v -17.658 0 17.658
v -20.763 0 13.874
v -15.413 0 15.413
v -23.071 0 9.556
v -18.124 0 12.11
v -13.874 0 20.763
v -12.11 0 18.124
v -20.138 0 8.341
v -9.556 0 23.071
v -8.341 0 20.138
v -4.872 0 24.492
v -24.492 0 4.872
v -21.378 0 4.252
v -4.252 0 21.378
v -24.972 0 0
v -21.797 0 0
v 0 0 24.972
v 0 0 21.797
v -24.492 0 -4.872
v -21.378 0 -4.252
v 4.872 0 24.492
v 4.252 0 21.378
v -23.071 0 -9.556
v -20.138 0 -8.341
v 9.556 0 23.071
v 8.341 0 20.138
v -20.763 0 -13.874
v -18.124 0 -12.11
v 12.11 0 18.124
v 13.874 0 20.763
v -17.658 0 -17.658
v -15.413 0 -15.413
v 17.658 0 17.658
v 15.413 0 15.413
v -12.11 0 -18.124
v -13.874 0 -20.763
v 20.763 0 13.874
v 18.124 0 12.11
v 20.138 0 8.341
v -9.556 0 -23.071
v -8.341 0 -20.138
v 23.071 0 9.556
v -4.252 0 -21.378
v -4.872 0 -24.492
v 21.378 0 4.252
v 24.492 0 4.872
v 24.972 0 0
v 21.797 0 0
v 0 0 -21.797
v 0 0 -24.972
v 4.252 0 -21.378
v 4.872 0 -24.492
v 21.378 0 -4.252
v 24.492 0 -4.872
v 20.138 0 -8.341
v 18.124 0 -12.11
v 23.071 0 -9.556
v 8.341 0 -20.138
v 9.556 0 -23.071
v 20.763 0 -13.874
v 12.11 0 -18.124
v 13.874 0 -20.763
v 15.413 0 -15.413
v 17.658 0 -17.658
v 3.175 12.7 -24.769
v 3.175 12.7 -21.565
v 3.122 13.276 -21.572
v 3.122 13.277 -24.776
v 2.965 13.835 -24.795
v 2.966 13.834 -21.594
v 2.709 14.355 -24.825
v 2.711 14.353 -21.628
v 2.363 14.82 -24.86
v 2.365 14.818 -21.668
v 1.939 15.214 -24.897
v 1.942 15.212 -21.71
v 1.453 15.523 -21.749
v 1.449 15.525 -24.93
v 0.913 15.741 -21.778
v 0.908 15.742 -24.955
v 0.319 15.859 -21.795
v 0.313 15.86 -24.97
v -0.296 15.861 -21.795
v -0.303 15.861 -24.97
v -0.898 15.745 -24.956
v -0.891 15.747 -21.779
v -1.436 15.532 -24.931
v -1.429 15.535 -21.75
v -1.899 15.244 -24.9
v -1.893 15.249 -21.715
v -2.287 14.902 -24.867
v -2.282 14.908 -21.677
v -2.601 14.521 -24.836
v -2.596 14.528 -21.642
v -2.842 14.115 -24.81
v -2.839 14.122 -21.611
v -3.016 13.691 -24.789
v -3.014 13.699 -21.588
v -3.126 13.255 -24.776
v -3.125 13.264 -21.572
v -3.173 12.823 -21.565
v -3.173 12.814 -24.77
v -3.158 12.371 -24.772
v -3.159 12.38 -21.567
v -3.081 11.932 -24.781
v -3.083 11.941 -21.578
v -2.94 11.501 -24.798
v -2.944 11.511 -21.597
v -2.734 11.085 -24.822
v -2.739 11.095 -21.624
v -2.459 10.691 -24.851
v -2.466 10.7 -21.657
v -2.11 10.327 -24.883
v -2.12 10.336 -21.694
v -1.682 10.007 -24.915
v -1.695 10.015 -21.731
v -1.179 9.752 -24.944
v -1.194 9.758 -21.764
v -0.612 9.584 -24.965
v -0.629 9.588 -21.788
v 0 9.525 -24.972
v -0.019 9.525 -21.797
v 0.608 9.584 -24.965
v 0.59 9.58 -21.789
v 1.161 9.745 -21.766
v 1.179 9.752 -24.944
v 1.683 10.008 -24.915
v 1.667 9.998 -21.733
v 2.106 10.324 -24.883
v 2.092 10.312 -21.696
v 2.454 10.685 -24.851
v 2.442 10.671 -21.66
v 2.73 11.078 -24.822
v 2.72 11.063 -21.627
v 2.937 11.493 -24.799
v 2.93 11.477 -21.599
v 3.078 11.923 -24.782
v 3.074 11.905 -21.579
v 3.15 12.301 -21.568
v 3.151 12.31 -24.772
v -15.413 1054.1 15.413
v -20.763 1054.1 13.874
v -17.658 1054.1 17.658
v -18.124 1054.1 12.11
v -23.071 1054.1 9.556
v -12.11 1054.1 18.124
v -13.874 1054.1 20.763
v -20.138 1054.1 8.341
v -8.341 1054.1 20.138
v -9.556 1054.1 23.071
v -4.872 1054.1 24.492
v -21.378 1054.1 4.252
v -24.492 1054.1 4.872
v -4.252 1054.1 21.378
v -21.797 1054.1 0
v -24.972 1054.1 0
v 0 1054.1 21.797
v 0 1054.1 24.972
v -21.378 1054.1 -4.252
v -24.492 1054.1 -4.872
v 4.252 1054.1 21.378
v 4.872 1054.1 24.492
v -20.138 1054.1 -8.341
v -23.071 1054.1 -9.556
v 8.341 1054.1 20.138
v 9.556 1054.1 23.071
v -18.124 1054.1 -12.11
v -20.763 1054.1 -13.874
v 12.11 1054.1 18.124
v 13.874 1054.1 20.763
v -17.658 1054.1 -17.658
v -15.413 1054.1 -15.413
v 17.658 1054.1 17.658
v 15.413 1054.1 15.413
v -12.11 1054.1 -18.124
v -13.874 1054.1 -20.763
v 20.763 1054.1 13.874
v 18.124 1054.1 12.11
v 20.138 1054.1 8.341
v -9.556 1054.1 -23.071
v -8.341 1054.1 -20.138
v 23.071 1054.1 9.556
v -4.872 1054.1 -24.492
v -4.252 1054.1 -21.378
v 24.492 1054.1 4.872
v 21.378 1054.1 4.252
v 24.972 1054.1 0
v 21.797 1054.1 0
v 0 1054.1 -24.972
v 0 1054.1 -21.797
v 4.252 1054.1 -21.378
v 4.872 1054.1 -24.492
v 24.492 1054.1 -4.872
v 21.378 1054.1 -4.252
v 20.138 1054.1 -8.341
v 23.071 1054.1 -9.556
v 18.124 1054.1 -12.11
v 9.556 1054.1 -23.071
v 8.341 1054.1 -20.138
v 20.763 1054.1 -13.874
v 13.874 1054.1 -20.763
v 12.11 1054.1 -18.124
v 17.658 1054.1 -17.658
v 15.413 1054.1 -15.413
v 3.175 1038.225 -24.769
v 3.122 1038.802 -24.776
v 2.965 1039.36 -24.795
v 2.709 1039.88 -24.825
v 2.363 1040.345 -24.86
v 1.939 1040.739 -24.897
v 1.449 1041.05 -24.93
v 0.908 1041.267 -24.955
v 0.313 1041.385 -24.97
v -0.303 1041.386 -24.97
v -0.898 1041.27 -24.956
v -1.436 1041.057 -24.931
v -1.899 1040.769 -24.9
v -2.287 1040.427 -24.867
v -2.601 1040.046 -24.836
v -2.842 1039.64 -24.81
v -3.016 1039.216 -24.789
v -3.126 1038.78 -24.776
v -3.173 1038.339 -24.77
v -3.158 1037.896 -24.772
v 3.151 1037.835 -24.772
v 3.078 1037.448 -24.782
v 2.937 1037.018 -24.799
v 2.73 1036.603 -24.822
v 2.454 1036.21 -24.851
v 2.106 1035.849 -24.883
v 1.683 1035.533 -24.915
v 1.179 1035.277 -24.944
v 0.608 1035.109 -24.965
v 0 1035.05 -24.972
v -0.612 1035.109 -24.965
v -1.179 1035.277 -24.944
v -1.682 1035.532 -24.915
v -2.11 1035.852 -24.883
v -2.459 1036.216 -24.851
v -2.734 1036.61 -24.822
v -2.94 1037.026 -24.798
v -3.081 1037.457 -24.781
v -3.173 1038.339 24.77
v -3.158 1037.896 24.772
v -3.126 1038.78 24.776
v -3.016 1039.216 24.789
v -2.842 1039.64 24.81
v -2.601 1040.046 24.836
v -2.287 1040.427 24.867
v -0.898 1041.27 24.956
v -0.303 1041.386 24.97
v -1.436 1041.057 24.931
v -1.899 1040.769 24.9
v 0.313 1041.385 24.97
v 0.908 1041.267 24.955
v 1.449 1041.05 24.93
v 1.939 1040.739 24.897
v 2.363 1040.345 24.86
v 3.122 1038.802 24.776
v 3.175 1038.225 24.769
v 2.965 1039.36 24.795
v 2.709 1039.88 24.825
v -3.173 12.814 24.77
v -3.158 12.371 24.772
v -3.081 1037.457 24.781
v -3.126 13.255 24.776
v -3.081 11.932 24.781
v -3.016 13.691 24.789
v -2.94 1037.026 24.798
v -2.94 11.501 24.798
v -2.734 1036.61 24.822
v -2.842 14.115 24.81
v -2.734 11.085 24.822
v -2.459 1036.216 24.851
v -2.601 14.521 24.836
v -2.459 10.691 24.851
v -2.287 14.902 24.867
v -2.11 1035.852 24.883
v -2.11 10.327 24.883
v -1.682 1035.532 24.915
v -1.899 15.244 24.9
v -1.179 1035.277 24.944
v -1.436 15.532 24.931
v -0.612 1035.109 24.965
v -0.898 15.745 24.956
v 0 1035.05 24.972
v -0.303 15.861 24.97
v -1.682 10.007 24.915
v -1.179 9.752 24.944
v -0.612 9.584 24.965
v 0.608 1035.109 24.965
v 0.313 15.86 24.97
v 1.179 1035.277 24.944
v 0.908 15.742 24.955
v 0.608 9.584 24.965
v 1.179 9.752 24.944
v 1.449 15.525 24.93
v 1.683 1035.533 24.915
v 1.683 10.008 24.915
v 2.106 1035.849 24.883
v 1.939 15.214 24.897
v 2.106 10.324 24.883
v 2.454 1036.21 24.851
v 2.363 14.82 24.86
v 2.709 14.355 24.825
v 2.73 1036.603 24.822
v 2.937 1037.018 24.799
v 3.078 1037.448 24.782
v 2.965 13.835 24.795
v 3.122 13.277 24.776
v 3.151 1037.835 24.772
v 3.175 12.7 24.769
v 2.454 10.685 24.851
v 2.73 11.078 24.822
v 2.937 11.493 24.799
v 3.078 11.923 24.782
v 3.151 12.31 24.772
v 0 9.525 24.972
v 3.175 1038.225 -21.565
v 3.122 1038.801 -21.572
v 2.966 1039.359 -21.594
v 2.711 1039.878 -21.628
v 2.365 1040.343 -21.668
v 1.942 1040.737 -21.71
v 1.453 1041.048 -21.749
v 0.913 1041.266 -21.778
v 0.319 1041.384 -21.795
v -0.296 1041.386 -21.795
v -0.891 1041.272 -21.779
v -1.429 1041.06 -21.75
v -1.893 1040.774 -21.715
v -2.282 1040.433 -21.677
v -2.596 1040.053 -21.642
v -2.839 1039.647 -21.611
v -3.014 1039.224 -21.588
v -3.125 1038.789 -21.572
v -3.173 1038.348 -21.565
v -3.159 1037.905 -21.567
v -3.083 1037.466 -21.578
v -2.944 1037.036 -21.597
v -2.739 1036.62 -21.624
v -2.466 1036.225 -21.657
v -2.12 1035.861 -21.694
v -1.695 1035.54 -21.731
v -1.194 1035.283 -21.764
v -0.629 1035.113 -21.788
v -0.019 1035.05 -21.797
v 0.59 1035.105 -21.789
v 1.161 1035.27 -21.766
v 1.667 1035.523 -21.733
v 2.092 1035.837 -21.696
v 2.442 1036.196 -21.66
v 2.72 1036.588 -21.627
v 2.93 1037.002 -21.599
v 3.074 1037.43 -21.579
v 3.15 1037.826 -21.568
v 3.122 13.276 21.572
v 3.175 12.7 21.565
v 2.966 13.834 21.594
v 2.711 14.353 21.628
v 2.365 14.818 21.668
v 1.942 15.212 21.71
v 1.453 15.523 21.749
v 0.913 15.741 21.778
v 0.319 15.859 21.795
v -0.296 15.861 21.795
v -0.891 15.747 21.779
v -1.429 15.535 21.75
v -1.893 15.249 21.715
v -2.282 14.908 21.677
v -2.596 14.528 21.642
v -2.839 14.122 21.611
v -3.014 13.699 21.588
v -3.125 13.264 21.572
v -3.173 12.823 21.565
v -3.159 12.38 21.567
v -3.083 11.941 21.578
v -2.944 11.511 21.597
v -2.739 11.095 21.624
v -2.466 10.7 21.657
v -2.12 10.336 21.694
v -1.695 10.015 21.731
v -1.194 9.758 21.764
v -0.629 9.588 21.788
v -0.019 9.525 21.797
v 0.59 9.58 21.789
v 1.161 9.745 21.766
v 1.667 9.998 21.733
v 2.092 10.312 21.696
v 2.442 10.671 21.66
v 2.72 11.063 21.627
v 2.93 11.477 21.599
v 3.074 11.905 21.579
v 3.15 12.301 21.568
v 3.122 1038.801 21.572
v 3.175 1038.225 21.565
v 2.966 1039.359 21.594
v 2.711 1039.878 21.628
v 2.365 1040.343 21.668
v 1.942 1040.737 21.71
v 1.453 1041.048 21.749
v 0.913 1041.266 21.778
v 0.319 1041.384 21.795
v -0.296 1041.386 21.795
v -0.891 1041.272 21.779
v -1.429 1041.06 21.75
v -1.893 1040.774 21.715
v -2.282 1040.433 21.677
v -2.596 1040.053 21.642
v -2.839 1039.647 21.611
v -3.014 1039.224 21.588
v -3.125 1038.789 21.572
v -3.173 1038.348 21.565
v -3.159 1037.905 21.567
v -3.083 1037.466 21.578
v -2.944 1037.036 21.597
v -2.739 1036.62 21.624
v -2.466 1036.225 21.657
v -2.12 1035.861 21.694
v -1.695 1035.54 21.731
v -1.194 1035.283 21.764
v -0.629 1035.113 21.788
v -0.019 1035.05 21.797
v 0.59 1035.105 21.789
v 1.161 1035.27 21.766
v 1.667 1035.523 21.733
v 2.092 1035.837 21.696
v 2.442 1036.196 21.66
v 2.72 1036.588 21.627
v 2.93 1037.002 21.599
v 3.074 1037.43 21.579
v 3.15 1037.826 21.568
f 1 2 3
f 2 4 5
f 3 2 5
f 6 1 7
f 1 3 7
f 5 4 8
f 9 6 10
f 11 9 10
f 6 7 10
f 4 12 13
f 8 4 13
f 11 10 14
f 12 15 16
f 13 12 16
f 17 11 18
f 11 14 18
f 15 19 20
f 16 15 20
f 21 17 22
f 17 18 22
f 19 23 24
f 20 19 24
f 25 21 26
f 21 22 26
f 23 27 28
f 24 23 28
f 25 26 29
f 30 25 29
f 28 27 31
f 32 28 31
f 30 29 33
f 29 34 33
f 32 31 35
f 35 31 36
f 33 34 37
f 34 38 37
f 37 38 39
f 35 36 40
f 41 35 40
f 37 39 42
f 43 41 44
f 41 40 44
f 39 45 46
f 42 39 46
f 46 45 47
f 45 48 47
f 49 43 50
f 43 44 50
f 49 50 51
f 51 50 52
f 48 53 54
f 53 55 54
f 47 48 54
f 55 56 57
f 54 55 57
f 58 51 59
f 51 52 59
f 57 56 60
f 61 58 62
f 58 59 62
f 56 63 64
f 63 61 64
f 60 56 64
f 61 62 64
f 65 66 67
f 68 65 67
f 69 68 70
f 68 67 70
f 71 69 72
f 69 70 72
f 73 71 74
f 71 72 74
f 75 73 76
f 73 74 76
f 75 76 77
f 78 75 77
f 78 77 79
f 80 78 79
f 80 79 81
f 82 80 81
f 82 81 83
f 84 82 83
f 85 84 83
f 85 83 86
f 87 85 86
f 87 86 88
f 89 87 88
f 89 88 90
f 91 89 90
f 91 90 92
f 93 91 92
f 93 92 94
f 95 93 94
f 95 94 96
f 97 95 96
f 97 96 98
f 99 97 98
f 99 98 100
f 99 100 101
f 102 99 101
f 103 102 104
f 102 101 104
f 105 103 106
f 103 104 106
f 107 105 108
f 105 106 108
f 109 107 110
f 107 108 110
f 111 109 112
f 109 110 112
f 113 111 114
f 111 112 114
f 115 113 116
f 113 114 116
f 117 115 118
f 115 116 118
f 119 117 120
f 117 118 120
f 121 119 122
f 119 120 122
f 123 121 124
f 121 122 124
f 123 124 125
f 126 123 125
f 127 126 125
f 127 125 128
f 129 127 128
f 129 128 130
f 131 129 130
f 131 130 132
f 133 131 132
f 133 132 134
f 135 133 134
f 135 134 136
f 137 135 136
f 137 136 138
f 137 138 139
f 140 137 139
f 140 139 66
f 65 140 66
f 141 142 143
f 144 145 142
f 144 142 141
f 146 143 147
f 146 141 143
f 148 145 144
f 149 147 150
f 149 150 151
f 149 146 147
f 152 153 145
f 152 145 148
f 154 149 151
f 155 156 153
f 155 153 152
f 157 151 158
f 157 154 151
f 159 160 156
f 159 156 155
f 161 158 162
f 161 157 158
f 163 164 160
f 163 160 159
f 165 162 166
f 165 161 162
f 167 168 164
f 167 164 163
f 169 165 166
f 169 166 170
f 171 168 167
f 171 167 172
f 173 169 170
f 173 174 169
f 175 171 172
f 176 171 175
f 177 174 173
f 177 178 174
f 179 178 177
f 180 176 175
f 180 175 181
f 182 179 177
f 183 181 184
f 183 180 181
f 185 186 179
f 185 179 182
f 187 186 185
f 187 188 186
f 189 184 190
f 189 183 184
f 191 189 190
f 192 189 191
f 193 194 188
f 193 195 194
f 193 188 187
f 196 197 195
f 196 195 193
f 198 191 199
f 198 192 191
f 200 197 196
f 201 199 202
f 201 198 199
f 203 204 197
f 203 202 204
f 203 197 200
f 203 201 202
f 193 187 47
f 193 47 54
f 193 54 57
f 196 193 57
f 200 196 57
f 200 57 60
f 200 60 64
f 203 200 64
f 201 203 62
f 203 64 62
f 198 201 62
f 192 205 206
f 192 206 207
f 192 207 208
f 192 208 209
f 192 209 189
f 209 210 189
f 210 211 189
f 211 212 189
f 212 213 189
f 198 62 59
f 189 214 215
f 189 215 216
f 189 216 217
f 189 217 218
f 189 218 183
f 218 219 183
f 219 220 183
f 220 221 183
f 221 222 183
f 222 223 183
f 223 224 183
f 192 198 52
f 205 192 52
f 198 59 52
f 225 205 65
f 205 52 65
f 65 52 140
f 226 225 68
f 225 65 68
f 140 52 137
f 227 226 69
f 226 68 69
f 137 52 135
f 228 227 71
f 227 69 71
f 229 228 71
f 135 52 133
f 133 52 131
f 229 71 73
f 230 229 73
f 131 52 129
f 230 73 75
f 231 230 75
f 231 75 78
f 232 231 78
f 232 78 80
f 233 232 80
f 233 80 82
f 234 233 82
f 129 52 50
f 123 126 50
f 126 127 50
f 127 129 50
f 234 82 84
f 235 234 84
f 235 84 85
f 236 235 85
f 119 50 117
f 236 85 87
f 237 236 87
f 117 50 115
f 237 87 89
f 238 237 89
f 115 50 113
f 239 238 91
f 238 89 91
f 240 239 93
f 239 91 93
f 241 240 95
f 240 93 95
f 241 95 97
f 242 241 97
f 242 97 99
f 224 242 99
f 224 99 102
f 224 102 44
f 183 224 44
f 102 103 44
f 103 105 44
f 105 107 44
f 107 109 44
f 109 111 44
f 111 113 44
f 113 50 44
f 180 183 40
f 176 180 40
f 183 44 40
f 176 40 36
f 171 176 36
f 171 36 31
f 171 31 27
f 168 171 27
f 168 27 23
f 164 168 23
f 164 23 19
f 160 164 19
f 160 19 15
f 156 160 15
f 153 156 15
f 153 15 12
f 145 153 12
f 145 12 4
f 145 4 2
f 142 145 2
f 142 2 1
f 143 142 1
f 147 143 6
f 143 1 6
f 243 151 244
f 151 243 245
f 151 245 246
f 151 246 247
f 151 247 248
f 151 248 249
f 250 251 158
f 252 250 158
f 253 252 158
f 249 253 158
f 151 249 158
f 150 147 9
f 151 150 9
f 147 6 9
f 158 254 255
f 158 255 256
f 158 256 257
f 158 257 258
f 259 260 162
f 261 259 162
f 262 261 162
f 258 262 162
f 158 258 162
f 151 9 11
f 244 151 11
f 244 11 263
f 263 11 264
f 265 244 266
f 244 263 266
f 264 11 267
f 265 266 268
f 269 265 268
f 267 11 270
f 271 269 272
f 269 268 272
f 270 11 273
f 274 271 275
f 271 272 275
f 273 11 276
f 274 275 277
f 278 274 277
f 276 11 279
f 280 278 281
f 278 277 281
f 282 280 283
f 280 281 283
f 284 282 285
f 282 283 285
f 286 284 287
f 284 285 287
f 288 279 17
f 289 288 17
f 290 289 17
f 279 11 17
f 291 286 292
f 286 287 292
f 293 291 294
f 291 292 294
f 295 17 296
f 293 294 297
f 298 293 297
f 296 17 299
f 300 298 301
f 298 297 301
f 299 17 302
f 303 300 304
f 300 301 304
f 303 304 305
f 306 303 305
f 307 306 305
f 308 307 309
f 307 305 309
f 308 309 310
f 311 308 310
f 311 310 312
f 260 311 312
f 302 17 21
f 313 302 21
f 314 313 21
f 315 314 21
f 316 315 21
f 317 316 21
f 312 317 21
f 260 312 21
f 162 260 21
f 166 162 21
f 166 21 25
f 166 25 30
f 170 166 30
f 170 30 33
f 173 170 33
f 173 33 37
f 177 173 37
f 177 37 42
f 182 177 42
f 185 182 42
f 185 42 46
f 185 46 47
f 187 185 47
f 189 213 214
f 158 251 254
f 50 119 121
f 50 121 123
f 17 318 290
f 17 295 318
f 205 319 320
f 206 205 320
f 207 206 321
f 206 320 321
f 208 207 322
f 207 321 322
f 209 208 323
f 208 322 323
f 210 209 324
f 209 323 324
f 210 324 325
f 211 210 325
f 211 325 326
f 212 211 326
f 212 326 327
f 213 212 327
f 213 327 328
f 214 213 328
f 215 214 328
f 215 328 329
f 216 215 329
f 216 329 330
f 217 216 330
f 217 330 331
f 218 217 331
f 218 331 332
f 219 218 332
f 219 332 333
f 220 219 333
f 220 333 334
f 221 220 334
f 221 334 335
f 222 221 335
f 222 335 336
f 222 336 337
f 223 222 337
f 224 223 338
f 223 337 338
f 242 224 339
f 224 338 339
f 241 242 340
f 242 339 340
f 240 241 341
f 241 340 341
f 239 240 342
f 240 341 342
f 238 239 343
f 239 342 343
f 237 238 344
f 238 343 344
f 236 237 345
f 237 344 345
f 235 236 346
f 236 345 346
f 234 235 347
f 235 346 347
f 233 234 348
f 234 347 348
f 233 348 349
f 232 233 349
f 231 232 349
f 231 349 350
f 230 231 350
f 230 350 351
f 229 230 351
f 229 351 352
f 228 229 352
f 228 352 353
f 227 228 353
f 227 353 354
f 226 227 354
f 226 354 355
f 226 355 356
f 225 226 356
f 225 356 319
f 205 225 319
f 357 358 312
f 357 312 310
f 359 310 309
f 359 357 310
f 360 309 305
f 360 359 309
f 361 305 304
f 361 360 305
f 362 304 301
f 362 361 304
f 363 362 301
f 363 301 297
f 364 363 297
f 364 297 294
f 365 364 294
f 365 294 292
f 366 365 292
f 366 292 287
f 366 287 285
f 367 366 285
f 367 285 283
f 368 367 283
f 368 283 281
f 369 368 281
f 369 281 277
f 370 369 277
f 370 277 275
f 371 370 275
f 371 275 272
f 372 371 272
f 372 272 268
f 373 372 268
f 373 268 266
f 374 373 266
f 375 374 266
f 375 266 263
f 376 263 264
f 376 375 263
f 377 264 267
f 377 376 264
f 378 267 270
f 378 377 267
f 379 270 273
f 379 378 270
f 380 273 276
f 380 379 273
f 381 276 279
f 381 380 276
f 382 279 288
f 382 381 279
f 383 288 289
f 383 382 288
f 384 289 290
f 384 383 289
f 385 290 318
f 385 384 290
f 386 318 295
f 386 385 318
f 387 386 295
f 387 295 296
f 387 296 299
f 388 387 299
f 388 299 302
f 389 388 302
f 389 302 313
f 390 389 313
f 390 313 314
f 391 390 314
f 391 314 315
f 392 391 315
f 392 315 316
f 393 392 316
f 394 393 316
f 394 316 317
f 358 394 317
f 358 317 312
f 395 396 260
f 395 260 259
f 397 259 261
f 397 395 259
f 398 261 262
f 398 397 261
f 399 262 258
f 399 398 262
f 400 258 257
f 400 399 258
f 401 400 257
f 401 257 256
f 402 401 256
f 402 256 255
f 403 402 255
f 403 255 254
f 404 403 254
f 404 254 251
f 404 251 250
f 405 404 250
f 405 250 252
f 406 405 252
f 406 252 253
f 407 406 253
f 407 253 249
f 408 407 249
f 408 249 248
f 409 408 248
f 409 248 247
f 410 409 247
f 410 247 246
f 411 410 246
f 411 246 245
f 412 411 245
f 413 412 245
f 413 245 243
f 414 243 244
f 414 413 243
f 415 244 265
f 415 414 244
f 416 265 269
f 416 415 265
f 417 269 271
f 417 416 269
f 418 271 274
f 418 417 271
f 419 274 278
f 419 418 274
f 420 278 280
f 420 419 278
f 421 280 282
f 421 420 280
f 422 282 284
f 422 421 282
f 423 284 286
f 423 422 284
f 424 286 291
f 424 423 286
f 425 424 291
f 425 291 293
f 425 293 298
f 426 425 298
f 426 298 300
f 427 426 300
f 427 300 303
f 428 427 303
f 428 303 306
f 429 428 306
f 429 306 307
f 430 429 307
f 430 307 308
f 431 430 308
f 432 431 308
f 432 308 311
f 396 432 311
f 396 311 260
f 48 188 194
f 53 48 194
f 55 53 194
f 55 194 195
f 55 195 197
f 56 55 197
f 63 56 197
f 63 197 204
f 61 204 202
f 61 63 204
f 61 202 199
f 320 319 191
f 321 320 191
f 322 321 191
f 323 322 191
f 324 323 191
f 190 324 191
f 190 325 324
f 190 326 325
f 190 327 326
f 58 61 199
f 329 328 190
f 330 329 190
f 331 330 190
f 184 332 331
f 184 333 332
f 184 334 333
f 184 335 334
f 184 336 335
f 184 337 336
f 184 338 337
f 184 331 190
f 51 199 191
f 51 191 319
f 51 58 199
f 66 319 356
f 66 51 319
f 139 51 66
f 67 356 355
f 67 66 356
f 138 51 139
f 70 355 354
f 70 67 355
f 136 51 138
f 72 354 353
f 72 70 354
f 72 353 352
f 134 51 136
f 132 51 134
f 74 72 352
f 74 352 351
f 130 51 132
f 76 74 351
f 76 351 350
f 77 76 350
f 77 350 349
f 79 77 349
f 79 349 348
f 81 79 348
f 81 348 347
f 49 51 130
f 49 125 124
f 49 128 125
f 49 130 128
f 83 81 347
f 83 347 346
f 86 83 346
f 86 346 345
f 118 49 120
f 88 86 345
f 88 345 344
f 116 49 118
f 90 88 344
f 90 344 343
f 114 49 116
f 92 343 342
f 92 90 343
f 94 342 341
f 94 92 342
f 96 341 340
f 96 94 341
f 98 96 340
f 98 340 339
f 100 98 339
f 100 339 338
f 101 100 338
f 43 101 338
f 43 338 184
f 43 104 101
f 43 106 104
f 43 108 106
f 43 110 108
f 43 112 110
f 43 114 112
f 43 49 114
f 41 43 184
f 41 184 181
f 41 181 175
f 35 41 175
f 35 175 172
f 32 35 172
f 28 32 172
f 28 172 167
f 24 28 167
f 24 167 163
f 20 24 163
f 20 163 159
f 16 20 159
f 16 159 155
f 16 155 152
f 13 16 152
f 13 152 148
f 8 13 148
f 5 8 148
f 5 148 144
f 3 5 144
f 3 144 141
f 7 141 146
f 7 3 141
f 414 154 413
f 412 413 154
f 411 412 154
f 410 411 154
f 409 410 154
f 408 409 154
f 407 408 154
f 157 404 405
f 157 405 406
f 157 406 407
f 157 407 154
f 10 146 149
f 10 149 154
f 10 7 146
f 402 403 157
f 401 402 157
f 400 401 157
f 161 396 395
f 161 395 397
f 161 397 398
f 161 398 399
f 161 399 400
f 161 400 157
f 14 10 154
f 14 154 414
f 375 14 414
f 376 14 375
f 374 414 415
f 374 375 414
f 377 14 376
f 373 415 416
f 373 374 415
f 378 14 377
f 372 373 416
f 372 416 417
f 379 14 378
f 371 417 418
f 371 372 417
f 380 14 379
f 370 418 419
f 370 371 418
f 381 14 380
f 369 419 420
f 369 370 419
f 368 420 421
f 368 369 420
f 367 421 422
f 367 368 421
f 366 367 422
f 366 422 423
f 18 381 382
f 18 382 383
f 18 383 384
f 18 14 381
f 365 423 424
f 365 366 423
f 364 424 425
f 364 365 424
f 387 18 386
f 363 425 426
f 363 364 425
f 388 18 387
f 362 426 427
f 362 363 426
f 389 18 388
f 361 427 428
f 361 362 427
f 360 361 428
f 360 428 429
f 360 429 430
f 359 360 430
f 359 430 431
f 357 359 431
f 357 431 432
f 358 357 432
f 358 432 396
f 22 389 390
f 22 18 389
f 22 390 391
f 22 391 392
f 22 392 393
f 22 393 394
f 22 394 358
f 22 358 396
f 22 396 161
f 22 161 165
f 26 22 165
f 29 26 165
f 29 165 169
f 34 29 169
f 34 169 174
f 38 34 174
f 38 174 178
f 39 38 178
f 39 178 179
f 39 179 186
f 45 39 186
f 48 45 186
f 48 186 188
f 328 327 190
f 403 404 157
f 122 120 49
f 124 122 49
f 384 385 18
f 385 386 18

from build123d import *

# Parameters (mm, degrees)
SKETCH2_R               = 24.97201
SKETCH2_R_2             = 21.79701
EXTRUDE_THIN1_DEPTH     = 1054.1
SKETCH3_R               = 3.175
CUT_EXTRUDE2_DEPTH      = 25.97201
CUT_EXTRUDE2_DEPTH_BACK = 25.97201


with BuildPart() as part:
    # Sketch2 → Extrude-Thin1 (new body)
    with BuildSketch(Plane(origin=(0, 0, 0), x_dir=(1, 0, 0), z_dir=(0, 1, 0))):
        Circle(SKETCH2_R)
        Circle(SKETCH2_R_2, mode=Mode.SUBTRACT)
    extrude(amount=EXTRUDE_THIN1_DEPTH)

    # Sketch3 → Cut-Extrude2 (cut, two sides)
    with BuildSketch(Plane.XY) as cut_extrude2_sk:
        with Locations((0, 12.7)):
            Circle(SKETCH3_R)
        with Locations((0, 1038.225)):
            Circle(SKETCH3_R)
    extrude(amount=CUT_EXTRUDE2_DEPTH, mode=Mode.SUBTRACT)
    extrude(cut_extrude2_sk.sketch, amount=-CUT_EXTRUDE2_DEPTH_BACK, mode=Mode.SUBTRACT)


solid = part.part
